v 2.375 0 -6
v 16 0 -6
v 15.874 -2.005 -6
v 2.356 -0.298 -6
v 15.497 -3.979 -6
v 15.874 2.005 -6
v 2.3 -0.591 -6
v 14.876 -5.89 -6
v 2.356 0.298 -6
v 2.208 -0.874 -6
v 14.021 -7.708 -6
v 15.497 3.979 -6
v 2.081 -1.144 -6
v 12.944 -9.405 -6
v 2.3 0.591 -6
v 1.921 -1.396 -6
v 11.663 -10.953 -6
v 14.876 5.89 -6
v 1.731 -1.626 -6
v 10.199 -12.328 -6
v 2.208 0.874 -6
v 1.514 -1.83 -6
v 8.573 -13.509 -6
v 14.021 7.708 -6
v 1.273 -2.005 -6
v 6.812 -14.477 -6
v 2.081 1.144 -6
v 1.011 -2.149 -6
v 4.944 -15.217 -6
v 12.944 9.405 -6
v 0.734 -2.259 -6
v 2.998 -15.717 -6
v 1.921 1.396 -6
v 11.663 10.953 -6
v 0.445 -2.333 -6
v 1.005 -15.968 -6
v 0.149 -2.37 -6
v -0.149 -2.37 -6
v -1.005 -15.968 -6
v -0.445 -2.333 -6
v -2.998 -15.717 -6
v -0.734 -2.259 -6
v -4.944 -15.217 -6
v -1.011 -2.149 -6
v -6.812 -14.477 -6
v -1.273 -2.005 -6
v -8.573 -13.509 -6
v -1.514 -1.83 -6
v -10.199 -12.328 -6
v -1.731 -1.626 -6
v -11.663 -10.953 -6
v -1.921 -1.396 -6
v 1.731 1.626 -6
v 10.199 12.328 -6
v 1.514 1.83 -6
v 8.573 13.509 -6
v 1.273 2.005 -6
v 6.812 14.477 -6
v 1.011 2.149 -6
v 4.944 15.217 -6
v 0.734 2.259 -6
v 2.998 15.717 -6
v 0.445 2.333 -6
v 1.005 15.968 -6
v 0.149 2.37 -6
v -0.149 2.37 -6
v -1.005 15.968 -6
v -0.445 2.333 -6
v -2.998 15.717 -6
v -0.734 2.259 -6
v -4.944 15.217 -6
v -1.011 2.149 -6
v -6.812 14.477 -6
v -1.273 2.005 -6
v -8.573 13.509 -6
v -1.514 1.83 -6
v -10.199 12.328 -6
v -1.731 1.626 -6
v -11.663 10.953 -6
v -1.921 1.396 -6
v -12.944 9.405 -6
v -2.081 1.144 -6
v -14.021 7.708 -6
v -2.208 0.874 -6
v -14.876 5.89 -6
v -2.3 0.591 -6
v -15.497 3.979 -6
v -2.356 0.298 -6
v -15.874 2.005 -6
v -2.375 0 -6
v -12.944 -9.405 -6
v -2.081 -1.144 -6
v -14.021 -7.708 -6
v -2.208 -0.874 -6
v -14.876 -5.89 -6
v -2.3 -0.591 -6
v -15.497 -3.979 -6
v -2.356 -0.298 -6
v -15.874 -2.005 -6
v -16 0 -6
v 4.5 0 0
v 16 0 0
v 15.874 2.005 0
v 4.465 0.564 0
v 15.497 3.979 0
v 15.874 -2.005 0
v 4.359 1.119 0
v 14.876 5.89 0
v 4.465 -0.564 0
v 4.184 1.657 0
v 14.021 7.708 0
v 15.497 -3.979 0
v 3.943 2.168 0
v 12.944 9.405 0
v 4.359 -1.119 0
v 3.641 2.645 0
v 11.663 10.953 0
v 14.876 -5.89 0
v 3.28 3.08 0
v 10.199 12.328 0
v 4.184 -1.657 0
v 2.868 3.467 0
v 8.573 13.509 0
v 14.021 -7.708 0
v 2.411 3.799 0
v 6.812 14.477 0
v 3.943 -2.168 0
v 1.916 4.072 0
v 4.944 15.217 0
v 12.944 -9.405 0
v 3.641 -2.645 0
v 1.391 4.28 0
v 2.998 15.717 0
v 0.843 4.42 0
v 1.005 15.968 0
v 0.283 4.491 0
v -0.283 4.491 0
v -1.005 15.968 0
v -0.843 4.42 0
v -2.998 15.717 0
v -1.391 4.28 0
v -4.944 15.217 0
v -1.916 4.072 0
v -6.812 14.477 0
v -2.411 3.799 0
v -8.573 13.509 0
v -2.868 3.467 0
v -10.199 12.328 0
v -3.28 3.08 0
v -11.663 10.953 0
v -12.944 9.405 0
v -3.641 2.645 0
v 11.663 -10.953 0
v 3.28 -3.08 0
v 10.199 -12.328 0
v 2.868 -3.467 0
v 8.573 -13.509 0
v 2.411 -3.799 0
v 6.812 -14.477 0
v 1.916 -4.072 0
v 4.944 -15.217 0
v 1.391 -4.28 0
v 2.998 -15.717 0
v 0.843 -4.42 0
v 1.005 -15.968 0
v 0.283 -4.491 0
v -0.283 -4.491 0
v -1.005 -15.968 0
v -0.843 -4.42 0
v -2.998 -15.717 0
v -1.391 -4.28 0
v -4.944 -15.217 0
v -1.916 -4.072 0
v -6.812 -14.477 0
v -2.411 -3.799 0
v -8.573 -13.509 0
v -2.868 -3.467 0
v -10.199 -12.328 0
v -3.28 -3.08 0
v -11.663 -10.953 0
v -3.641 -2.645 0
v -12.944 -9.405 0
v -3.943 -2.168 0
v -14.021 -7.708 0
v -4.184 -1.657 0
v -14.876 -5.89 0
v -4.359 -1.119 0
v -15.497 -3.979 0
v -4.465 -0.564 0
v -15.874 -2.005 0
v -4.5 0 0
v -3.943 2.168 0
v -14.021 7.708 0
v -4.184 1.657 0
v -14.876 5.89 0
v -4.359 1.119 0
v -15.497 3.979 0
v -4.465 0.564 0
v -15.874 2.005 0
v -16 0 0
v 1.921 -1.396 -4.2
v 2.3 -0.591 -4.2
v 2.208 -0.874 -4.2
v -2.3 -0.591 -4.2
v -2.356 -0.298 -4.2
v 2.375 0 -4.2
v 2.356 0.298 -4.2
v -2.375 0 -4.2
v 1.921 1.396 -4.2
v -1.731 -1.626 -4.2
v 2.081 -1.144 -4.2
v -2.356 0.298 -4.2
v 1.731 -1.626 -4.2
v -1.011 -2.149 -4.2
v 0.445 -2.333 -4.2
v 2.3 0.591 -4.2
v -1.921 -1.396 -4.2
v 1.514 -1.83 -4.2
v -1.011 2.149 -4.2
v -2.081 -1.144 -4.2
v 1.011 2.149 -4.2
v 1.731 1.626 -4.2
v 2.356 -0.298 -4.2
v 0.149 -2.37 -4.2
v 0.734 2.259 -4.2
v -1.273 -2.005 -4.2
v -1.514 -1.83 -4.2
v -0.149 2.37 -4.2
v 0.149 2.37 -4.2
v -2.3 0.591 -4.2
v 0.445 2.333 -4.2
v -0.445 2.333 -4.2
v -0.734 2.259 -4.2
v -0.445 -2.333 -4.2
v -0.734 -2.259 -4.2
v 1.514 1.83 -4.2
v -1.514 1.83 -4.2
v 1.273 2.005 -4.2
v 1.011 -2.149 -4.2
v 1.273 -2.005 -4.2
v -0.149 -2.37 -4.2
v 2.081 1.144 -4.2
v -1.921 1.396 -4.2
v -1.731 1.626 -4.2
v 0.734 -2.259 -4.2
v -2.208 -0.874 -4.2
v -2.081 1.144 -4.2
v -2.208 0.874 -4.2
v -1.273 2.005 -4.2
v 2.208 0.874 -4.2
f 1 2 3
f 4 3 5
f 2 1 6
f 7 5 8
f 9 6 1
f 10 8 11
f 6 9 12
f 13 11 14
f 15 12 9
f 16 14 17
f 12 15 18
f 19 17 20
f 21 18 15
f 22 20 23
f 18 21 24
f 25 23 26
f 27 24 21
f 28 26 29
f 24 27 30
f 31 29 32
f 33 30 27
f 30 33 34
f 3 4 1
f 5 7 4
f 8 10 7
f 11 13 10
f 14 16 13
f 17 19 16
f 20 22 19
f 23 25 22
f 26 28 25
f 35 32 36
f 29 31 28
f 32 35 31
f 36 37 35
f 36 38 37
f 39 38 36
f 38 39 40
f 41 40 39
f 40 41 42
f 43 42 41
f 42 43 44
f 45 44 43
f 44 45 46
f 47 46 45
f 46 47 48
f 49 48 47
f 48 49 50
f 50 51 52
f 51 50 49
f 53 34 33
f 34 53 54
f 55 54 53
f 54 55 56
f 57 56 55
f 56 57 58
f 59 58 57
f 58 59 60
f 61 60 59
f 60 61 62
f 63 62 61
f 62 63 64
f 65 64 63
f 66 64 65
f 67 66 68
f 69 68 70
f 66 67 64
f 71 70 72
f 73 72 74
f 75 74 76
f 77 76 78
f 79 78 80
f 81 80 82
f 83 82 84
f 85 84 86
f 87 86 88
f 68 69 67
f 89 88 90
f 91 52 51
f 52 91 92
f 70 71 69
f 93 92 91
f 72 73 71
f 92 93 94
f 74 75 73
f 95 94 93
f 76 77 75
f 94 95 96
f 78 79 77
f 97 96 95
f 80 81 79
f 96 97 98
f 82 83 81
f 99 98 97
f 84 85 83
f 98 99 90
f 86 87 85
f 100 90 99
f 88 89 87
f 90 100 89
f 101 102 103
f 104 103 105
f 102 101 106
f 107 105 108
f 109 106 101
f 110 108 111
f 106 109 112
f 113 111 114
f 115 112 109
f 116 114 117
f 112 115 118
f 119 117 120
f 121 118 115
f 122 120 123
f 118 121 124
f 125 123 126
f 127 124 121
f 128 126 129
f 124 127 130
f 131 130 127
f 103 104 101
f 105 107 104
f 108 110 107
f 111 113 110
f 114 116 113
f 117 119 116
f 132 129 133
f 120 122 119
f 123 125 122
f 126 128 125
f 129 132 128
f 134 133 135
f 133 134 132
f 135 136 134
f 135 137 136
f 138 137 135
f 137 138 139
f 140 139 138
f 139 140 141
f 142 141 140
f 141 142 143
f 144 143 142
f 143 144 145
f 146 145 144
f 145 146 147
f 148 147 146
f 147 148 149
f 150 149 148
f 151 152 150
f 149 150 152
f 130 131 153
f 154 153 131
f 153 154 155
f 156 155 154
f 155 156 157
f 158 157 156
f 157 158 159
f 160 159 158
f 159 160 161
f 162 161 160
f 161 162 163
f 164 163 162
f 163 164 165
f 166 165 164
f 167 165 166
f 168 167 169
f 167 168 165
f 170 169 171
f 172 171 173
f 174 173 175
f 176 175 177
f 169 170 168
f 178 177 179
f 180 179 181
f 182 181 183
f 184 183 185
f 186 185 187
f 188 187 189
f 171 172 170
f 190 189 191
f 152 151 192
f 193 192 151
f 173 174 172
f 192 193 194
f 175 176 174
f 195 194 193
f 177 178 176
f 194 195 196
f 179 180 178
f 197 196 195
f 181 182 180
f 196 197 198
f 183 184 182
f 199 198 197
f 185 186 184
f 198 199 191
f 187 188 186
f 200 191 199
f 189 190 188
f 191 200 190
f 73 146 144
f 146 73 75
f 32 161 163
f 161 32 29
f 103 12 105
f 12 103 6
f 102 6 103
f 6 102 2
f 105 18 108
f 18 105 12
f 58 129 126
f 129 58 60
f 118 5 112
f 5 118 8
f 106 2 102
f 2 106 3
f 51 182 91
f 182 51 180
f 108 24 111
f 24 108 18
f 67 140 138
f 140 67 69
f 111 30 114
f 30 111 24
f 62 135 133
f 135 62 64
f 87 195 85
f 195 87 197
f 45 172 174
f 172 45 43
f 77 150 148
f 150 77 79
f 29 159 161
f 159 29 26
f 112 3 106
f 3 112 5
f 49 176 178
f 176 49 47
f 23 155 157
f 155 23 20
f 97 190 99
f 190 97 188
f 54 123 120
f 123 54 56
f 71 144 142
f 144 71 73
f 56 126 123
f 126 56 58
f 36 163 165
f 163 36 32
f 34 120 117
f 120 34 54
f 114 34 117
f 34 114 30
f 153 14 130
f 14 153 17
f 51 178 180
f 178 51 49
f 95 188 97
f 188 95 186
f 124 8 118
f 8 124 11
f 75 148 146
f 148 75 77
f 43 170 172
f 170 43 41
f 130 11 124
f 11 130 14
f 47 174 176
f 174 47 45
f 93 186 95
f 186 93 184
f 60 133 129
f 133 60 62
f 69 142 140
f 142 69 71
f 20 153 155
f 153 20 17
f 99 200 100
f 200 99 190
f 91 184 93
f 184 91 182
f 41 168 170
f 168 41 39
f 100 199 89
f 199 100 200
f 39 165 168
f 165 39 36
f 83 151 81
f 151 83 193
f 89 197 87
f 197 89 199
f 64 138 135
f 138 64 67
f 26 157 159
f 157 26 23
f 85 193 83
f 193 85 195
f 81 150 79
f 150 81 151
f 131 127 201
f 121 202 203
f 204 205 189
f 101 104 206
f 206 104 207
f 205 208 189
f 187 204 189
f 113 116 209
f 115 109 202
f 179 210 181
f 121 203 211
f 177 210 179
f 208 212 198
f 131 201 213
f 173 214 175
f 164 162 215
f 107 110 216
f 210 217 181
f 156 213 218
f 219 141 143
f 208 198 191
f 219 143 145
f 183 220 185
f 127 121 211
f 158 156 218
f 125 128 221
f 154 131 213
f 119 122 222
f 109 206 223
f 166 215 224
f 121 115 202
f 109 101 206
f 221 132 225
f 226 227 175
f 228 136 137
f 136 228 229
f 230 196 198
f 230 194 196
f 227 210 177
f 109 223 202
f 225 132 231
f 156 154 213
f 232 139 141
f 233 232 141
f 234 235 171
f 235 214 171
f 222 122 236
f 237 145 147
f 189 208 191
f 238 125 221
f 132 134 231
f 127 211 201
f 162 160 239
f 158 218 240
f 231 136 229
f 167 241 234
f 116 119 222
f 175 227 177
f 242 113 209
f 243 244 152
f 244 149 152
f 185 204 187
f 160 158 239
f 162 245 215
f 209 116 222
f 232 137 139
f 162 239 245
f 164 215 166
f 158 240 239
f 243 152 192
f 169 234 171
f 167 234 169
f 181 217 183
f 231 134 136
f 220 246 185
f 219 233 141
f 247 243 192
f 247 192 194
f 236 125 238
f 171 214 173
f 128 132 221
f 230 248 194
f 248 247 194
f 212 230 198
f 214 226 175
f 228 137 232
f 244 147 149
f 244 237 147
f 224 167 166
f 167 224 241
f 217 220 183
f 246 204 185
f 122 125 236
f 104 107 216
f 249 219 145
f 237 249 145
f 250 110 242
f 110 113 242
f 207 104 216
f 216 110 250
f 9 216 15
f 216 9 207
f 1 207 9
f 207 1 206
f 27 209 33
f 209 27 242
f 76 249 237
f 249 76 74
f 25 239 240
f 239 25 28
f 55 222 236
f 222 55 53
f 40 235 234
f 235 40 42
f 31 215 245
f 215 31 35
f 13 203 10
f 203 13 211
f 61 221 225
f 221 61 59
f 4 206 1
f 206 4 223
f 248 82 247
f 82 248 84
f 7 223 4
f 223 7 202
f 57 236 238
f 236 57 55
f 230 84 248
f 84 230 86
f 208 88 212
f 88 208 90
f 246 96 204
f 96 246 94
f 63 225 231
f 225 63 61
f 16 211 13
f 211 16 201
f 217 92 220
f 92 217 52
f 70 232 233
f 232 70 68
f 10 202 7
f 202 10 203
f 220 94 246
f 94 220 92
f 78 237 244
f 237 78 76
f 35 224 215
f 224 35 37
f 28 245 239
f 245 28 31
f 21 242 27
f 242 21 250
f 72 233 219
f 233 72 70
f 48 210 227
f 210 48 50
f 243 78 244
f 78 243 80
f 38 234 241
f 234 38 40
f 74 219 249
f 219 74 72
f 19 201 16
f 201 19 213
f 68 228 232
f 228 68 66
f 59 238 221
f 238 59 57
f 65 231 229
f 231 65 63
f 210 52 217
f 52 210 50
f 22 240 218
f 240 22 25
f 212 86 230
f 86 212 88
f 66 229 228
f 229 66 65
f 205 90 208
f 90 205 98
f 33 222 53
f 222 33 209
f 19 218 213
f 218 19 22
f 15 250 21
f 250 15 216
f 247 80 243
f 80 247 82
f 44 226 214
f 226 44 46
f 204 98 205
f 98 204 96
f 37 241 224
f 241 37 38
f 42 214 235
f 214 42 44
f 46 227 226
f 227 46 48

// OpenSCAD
$fn = 50;


difference() {
	union() {
		translate(v = [0, 0, -6.0000000000]) {
			cylinder(h = 6, r = 10.0000000000);
		}
		translate(v = [0, 0, -6.0000000000]) {
			cylinder(h = 6, r = 16.0000000000);
		}
	}
	union() {
		translate(v = [0, 0, 0]) {
			rotate(a = [0, 0, 0]) {
				difference() {
					union() {
						#translate(v = [0, 0, -6.0000000000]) {
							cylinder(h = 6, r = 2.2500000000);
						}
						#translate(v = [0, 0, -4.2000000000]) {
							cylinder(h = 4.2000000000, r = 10.0000000000, r1 = 2.3750000000, r2 = 4.5000000000);
						}
						#translate(v = [0, 0, -6.0000000000]) {
							cylinder(h = 6, r = 2.3750000000);
						}
						#translate(v = [0, 0, -6.0000000000]) {
							cylinder(h = 6, r = 2.2500000000);
						}
					}
					union();
				}
			}
		}
	}
}
